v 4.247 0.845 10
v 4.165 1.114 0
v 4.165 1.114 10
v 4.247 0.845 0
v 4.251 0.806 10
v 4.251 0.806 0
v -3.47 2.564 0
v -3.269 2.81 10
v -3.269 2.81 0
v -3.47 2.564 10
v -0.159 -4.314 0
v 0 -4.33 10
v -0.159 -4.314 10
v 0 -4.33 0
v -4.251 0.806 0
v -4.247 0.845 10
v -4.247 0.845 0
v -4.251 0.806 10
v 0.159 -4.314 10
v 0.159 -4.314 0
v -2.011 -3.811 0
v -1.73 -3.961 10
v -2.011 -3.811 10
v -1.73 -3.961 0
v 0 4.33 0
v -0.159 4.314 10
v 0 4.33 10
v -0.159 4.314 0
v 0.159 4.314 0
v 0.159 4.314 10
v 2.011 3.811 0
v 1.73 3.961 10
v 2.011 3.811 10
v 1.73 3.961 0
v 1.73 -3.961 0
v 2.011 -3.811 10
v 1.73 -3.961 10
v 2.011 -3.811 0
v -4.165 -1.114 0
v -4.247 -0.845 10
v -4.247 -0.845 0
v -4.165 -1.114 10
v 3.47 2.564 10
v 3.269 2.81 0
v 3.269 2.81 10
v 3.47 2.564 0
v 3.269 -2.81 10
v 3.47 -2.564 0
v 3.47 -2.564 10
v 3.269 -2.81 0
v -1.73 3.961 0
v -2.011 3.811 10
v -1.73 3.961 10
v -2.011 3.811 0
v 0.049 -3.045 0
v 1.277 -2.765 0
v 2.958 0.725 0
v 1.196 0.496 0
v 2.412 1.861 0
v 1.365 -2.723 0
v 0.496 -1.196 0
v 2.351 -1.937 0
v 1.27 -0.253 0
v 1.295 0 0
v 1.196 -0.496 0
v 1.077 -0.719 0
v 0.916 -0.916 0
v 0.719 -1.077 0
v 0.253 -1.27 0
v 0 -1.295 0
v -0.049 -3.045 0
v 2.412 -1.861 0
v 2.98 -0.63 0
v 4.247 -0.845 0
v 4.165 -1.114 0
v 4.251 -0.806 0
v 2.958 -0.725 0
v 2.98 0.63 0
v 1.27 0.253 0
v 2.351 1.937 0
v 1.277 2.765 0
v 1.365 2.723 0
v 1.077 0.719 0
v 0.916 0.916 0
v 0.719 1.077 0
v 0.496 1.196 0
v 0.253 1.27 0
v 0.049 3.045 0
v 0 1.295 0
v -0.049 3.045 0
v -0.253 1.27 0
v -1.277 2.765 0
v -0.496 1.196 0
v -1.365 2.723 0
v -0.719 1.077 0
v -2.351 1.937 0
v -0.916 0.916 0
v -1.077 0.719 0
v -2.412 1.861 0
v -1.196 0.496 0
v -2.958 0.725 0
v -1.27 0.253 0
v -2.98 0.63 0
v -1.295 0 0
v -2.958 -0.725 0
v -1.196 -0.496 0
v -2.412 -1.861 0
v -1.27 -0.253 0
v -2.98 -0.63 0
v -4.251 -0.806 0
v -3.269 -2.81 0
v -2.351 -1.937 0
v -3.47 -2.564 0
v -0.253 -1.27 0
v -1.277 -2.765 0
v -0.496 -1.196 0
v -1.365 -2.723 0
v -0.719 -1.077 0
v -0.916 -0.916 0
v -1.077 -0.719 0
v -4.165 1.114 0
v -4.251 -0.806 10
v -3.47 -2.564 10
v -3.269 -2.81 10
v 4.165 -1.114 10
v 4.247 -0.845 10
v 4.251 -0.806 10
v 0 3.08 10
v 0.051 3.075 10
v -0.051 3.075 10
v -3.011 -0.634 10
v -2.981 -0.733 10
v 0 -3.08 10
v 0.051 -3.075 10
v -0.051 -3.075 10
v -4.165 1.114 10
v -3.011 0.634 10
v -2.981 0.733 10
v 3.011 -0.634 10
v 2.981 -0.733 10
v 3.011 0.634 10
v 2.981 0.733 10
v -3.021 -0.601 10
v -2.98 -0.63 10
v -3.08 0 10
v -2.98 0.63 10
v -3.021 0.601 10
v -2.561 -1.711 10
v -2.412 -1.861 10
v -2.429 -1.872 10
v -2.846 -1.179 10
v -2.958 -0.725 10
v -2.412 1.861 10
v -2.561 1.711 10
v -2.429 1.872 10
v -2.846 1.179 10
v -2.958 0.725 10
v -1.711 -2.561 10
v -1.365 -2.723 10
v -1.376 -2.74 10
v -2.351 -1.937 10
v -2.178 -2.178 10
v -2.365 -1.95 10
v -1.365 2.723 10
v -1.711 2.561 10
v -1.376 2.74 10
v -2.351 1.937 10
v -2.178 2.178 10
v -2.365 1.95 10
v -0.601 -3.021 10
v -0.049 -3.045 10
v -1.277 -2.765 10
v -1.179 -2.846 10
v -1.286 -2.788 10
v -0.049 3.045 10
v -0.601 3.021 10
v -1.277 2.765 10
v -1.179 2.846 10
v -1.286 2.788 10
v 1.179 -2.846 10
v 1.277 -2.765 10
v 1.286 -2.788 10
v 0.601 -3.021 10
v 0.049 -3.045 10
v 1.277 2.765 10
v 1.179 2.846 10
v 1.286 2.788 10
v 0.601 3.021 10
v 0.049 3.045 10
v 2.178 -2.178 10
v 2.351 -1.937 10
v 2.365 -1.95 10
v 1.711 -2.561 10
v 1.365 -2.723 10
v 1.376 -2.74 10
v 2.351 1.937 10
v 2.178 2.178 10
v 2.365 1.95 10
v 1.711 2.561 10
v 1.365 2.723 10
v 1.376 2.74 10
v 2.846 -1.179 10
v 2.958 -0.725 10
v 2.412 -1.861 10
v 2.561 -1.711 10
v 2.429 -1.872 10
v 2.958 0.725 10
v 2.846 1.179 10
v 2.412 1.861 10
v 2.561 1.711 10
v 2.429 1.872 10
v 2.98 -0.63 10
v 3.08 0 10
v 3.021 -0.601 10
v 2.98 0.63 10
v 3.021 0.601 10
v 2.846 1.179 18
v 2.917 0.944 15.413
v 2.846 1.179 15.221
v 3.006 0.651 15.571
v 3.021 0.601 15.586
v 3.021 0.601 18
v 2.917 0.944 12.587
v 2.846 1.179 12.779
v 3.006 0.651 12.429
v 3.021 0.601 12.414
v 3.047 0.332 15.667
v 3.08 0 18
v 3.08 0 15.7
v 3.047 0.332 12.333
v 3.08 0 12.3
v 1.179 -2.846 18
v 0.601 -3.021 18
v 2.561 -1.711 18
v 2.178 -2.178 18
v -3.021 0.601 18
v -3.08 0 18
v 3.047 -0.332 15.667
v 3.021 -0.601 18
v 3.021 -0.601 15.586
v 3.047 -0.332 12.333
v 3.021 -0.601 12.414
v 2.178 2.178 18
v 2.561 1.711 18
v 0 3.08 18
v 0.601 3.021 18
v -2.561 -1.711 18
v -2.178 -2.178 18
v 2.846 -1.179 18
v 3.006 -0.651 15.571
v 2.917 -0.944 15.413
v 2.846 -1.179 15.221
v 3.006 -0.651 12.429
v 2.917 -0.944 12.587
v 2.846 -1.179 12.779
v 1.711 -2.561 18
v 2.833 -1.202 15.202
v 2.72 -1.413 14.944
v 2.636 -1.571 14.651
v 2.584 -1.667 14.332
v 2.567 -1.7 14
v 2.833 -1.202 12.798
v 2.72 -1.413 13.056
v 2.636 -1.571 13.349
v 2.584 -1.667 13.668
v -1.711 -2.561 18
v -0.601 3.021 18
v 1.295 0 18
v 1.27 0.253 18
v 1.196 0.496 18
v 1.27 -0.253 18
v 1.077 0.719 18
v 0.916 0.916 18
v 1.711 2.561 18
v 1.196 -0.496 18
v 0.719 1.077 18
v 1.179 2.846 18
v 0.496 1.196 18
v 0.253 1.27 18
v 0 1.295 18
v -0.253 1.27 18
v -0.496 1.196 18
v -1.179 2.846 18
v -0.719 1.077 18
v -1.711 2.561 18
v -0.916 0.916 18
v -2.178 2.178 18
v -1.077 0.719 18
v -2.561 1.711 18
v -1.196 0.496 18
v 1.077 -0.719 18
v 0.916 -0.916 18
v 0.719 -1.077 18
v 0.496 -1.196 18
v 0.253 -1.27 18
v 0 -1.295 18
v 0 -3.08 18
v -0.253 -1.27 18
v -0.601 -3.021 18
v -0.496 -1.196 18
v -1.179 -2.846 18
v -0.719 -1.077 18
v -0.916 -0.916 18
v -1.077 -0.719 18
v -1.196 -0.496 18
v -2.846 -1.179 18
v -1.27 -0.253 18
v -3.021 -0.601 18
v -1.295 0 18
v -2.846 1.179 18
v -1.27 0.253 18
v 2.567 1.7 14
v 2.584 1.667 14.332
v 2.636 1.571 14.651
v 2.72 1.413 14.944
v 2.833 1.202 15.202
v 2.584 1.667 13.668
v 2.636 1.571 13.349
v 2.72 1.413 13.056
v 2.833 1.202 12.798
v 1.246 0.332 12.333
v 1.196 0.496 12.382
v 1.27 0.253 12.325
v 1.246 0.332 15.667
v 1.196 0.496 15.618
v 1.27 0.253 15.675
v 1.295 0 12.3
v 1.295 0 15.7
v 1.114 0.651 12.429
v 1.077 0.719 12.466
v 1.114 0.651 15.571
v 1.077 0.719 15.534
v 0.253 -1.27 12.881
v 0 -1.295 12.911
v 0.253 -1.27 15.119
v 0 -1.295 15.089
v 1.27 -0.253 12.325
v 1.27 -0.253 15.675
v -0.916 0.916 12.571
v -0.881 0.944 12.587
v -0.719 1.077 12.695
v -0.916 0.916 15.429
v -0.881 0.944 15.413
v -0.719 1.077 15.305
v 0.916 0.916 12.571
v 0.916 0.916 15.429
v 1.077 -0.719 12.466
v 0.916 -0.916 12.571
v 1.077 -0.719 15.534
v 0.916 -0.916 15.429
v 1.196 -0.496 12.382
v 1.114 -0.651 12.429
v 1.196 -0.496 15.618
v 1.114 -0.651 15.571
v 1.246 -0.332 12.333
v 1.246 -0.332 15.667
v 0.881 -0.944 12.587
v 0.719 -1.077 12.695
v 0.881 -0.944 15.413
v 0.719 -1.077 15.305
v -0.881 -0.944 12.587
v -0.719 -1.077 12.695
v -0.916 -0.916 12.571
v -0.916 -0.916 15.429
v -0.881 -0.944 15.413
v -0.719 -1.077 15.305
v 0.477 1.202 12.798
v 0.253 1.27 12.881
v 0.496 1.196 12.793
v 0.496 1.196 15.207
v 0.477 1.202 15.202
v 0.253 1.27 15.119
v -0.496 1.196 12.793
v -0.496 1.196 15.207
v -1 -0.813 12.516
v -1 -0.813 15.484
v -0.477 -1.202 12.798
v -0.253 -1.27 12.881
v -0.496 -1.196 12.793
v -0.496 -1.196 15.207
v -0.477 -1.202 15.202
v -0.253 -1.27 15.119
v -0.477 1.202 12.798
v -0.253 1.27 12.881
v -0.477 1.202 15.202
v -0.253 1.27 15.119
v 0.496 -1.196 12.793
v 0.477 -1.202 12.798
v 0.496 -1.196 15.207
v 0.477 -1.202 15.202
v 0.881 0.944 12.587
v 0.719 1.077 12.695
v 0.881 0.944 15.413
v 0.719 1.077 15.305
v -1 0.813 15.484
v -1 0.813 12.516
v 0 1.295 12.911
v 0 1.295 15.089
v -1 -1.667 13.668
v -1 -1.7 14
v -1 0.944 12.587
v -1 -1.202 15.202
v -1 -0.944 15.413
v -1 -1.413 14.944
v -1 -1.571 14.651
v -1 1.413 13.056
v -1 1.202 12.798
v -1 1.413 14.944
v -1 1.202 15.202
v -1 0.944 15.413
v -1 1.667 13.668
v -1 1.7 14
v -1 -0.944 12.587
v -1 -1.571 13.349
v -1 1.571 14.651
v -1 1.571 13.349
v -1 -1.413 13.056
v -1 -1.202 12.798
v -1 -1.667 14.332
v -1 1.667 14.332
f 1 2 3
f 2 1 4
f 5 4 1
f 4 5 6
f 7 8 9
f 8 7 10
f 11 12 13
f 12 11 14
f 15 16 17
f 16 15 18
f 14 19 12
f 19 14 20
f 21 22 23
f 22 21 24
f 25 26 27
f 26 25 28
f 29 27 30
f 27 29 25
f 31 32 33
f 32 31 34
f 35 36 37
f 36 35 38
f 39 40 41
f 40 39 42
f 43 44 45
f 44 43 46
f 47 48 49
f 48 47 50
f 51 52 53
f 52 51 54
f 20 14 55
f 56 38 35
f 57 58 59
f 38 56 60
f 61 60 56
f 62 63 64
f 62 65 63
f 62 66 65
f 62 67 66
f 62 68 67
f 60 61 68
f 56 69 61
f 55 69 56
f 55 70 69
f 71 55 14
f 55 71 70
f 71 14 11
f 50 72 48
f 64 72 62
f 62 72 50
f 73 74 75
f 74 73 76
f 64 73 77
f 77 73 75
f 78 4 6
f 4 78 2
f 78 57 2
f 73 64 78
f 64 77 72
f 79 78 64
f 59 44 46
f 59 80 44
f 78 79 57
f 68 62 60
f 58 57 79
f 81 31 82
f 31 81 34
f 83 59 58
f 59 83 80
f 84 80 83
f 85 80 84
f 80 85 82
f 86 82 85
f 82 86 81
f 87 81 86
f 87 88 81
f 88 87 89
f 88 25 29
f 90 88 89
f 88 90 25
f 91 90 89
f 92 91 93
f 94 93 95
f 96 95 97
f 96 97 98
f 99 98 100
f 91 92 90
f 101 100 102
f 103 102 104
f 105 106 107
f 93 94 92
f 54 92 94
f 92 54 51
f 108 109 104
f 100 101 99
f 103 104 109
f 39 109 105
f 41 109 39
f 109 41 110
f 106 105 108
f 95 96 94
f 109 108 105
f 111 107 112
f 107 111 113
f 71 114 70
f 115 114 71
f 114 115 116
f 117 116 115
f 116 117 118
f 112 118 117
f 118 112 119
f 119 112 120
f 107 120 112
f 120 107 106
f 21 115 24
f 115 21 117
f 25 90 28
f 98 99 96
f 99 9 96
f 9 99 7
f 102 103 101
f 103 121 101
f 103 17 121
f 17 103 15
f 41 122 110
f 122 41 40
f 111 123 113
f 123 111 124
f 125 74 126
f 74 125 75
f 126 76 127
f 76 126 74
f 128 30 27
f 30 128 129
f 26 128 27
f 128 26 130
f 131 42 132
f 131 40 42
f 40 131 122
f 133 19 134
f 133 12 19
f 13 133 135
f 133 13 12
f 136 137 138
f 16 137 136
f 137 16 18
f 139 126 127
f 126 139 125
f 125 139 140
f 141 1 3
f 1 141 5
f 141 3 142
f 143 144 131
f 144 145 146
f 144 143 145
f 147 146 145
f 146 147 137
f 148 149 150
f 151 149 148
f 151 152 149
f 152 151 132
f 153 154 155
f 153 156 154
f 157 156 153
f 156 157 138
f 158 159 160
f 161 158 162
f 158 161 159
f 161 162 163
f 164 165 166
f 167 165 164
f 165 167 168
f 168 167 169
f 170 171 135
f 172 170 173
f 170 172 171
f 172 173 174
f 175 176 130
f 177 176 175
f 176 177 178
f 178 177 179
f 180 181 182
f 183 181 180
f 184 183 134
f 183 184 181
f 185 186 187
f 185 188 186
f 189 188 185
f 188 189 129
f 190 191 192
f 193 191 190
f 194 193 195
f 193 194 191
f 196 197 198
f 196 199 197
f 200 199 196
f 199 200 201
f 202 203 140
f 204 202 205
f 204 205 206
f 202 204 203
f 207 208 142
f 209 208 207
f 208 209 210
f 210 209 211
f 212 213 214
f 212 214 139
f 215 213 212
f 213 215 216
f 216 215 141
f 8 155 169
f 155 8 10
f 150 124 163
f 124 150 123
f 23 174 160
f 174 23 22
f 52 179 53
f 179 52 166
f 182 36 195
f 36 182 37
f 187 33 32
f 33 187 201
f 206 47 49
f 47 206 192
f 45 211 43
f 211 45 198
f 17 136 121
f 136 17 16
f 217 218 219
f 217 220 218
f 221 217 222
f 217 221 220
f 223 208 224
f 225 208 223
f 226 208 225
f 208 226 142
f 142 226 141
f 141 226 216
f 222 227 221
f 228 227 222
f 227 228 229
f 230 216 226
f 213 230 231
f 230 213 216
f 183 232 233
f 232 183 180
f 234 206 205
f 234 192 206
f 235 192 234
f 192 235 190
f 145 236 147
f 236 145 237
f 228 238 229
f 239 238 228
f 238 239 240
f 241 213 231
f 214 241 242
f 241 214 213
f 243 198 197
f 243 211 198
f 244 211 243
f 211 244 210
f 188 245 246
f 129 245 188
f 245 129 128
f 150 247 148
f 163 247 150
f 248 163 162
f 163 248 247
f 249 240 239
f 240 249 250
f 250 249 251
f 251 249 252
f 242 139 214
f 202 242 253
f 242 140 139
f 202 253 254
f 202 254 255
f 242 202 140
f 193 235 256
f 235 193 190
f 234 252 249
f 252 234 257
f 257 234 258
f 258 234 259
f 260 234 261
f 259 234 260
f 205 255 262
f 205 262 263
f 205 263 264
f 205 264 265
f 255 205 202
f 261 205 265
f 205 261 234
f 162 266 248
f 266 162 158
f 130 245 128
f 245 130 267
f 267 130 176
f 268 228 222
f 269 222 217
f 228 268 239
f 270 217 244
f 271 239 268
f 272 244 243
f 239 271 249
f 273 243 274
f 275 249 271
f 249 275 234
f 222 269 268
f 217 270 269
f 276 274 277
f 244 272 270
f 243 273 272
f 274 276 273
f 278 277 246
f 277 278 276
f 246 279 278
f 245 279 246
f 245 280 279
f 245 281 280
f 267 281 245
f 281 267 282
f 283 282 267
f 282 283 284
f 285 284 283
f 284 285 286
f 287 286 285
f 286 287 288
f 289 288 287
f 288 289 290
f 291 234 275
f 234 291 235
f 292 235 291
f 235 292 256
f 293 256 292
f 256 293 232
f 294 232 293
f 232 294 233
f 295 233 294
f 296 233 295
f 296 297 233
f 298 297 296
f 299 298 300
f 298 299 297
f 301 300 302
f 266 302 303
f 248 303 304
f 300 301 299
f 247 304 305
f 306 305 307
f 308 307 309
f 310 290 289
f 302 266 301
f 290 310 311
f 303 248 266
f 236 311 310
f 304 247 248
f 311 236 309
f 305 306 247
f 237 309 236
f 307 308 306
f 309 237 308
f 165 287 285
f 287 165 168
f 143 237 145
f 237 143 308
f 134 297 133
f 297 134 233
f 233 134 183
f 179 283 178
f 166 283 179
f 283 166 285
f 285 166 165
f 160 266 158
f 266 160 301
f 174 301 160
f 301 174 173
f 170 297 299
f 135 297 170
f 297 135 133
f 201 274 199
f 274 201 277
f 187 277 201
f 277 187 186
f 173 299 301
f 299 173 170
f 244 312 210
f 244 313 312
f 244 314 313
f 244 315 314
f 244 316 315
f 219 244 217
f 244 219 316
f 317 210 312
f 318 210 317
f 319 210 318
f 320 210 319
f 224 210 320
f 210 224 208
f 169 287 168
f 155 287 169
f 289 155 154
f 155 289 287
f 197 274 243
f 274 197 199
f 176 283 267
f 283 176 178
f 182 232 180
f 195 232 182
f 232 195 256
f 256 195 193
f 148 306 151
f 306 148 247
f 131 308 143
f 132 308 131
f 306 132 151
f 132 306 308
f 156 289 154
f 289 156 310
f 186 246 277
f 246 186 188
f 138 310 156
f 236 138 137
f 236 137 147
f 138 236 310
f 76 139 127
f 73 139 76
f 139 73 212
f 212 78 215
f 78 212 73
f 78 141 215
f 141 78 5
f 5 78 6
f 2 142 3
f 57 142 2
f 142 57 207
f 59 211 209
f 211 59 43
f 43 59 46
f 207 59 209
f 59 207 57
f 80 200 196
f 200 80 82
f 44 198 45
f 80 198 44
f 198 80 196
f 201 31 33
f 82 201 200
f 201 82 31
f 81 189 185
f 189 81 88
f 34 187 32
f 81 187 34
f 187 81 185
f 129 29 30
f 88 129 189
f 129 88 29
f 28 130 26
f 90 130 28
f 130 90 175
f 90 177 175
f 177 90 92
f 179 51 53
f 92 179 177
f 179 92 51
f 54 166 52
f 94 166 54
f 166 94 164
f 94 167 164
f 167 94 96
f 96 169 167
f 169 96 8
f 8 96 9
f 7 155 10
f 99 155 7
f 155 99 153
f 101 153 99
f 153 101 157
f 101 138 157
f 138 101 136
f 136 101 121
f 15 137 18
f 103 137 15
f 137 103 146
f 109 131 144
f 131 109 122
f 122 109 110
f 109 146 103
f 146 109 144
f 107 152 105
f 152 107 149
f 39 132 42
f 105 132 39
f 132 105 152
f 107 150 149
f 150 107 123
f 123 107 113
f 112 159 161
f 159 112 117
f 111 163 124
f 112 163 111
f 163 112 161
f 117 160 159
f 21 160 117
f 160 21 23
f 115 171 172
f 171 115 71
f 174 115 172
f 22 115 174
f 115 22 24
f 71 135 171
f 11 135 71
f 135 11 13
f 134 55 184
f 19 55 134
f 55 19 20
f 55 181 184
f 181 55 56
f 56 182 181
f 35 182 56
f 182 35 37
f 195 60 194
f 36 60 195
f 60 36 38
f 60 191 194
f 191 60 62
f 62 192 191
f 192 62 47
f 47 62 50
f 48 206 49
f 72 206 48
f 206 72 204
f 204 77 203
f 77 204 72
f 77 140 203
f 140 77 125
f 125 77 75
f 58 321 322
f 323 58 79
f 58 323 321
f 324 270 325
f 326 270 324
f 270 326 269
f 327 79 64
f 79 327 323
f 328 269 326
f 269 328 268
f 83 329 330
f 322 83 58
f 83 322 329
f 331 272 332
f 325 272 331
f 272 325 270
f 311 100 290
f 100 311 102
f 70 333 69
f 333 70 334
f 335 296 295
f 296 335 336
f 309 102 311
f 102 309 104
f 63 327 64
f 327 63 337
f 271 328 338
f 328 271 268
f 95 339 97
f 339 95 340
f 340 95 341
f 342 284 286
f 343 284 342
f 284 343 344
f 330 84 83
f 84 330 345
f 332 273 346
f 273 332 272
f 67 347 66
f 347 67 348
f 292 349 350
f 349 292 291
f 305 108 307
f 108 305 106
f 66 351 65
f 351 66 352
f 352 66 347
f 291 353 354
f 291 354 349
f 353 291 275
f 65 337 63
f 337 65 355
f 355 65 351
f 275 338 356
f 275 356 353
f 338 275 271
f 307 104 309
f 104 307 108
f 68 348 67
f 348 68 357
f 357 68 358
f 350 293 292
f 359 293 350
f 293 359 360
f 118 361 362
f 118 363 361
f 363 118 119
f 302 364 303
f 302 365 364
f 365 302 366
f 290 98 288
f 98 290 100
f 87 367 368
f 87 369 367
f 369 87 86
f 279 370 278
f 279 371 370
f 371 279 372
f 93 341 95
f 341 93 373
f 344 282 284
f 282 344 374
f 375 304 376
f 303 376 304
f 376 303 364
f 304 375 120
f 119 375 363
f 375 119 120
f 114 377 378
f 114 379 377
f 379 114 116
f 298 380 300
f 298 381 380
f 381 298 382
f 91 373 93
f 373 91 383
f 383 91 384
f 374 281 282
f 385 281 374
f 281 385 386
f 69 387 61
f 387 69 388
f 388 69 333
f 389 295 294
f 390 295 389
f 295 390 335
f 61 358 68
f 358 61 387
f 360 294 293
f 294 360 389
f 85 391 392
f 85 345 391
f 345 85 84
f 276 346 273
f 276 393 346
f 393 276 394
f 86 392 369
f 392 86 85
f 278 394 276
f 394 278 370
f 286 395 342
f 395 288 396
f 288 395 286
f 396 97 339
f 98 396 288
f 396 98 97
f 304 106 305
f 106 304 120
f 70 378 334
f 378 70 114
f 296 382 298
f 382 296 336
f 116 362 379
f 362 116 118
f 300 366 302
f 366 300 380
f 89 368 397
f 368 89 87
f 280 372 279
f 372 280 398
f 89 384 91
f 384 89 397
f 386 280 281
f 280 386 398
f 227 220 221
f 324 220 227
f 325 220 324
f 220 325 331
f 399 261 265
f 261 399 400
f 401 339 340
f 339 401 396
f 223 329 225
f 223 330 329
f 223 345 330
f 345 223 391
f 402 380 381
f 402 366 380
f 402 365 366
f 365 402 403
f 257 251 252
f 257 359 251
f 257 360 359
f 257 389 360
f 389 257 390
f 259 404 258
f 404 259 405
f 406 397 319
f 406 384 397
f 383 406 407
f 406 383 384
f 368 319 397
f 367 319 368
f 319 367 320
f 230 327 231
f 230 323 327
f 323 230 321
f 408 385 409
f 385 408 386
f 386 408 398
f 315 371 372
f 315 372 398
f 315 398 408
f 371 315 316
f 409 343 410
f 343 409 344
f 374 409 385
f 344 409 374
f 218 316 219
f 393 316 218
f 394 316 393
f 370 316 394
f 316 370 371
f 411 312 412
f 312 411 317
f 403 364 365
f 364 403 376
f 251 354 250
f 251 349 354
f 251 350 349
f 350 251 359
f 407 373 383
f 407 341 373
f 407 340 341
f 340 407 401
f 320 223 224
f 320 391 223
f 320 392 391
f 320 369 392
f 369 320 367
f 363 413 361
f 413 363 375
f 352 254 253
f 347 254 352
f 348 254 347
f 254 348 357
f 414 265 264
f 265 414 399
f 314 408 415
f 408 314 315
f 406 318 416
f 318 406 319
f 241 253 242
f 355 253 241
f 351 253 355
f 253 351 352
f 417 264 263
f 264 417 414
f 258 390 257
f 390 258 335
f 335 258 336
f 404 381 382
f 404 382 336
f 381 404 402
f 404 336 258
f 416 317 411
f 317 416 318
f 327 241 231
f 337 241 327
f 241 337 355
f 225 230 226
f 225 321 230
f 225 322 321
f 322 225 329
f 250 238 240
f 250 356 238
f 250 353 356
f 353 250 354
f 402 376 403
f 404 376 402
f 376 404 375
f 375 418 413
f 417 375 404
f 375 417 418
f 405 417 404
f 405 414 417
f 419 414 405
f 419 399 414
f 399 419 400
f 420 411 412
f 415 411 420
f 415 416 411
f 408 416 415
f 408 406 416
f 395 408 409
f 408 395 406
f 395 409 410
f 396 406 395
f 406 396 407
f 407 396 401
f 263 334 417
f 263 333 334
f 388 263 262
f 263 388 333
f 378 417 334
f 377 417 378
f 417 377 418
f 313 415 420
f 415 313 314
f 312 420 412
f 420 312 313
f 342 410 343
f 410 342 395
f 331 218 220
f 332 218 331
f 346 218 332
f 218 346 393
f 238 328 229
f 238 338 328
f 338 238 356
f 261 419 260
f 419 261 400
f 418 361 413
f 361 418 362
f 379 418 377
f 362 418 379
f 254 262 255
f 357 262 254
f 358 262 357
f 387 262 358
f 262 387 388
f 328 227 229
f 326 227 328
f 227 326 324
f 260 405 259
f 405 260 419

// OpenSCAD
$fn = 32;

// ----------------------------------------------------------------------
// Timing pulley: GT2 14T, pitch 2 mm, 8.66 mm x 18 mm
// ----------------------------------------------------------------------

// --- parameters (mm) ---
pitch = 2;                // belt pitch
teeth = 14;               // number of grooves
belt_w = 10;              // belt width between the flanges
tip_d = 8.66;             // tip circle diameter
root_d = 7.16;            // groove bottom diameter
groove_h = 0.75;          // groove depth
tooth_w = 1.5;            // groove width at the tip circle
bore_d = 2.59;            // shaft bore
hub_d = 6.16;             // hub diameter
hub_h = 8;                // hub above the flange
bottom_z = 0;             // lowest point of the pulley
top_z = 18;               // highest point of the pulley
set_d = 3.4;              // set screw tap hole

module rim() {
  cylinder(h = belt_w, d = tip_d);
}

module groove_cutter() {
  /* belt tooth groove: deeper than wide, cut through the belt width */
  translate([root_d / 2, 0, 0])
    linear_extrude(height = belt_w)
      polygon(points = [[-0.6, -tooth_w * 0.42], [groove_h + 0.6, -tooth_w * 0.6],
                        [groove_h + 0.6, tooth_w * 0.6], [-0.6, tooth_w * 0.42]]);
}

module hub() {
  translate([0, 0, bottom_z]) cylinder(h = top_z - bottom_z, d = hub_d);
}

difference() {
  union() {
    rim();
    hub();
  }
  for (i = [0 : teeth - 1]) rotate([0, 0, i * 360 / teeth]) groove_cutter();
  translate([0, 0, bottom_z - 1]) cylinder(h = top_z - bottom_z + 2, d = bore_d);
  translate([-1, 0, top_z - hub_h * 0.5]) rotate([0, 90, 0]) cylinder(h = hub_d / 2 + 3, d = set_d);
}
